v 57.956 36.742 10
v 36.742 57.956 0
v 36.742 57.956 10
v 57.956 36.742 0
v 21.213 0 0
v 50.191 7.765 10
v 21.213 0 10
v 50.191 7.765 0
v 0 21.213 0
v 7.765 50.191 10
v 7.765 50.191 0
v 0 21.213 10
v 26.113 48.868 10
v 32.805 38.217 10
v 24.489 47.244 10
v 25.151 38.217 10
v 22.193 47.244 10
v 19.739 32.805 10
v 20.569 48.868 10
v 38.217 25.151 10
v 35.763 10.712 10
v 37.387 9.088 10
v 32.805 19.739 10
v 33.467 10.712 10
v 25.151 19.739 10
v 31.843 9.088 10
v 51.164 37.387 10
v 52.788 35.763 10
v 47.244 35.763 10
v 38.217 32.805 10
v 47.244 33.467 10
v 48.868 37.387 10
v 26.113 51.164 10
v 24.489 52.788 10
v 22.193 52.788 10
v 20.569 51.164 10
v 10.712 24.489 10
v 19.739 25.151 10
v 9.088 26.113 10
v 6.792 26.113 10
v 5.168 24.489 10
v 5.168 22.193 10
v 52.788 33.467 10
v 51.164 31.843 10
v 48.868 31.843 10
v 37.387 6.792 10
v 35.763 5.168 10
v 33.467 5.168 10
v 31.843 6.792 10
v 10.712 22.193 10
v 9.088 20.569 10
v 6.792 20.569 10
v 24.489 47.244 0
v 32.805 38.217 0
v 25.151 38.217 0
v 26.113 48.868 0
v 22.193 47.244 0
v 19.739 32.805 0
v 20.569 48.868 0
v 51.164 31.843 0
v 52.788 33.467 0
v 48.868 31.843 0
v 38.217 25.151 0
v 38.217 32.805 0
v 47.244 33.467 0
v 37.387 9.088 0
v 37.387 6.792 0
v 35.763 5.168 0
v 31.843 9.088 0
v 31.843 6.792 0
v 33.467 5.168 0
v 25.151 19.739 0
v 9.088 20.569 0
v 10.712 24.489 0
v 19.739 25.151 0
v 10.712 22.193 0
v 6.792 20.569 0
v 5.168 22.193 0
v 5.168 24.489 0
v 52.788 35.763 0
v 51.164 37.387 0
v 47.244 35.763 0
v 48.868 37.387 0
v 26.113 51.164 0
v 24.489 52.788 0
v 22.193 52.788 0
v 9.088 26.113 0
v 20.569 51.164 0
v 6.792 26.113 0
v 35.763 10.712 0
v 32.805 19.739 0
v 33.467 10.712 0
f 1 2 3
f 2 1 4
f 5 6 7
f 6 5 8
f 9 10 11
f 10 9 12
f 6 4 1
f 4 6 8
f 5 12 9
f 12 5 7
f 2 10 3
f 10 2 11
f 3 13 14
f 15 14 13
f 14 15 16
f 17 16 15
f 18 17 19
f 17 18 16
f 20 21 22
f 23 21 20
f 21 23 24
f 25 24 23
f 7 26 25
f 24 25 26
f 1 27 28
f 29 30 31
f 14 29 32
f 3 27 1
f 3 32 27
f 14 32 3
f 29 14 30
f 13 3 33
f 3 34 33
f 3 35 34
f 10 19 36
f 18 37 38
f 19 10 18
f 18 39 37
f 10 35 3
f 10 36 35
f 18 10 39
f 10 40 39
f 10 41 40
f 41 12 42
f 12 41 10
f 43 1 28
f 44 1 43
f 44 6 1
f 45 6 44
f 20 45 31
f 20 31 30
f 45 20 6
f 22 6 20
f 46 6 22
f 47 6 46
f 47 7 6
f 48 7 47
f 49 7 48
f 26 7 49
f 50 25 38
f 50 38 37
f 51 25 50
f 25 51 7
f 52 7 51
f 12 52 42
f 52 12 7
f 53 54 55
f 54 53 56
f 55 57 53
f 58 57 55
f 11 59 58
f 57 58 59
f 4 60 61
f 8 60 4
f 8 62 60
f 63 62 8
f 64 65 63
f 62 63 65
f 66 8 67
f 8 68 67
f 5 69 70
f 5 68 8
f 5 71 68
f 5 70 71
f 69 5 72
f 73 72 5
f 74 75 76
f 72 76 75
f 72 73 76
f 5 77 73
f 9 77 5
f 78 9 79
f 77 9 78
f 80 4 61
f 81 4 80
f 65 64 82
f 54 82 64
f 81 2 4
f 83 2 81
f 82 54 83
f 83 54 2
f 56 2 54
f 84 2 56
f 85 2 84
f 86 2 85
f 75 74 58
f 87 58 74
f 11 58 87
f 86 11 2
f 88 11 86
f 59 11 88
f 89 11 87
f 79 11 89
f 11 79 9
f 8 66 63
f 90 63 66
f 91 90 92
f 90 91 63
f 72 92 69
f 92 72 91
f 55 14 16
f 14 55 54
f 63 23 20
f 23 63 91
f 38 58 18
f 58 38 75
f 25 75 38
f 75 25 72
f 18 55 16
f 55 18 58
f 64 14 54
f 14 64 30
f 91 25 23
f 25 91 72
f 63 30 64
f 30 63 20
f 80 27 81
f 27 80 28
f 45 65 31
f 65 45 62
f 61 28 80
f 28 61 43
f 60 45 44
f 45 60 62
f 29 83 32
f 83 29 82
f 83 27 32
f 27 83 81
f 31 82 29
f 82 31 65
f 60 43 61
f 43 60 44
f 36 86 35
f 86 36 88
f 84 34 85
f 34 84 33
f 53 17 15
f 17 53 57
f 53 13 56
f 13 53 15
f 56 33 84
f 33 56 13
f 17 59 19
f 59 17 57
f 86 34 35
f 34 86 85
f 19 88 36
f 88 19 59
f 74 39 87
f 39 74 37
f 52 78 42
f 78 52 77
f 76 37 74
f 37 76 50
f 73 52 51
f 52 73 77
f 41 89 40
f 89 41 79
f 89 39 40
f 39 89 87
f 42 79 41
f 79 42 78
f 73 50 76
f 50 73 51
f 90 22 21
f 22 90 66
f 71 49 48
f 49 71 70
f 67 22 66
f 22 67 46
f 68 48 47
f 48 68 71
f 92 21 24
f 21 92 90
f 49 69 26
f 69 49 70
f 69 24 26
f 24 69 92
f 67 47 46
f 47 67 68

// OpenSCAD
$fn = 32;

// ----------------------------------------------------------------------
// Polygon plate: 6-gon R30, 4 bolt windows
// ----------------------------------------------------------------------

// --- parameters (mm) ---
sides = 6;                // number of polygon sides
plate_r = 30;             // circumscribed radius of the polygon
bore_r = 10;              // centre bore radius
bolts = 4;                // number of bolt windows
ring_r = 21.78;           // bolt-circle radius
bolt_r = 3;               // bolt window radius
plate_t = 10;             // plate thickness, Z (extrusion height)

plate_d = 2 * plate_r;  // circumscribed diameter
bore_d = 2 * bore_r;  // centre bore diameter
bolt_d = 2 * bolt_r;  // bolt window diameter
ring_d = 2 * ring_r;  // bolt-circle diameter

profile = [[57.956, 36.742], [36.742, 57.956], [7.765, 50.191], [0, 21.213], [21.213, 0], [50.191, 7.765]];  // primary outline, 6 points, counter clockwise
void_1 = [[38.217, 32.805], [32.805, 38.217], [25.151, 38.217], [19.739, 32.805], [19.739, 25.151], [25.151, 19.739], [32.805, 19.739], [38.217, 25.151]];  // centre bore, 8 points
void_2 = [[52.788, 35.763], [51.164, 37.387], [48.868, 37.387], [47.244, 35.763], [47.244, 33.467], [48.868, 31.843], [51.164, 31.843], [52.788, 33.467]];  // bolt window 1, 8 points
void_3 = [[26.113, 51.164], [24.489, 52.788], [22.193, 52.788], [20.569, 51.164], [20.569, 48.868], [22.193, 47.244], [24.489, 47.244], [26.113, 48.868]];  // bolt window 2, 8 points
void_4 = [[10.712, 24.489], [9.088, 26.113], [6.792, 26.113], [5.168, 24.489], [5.168, 22.193], [6.792, 20.569], [9.088, 20.569], [10.712, 22.193]];  // bolt window 3, 8 points
void_5 = [[37.387, 9.088], [35.763, 10.712], [33.467, 10.712], [31.843, 9.088], [31.843, 6.792], [33.467, 5.168], [35.763, 5.168], [37.387, 6.792]];  // bolt window 4, 8 points

// --- the one profile operation ---
difference() {
  linear_extrude(height = plate_t) polygon(points = profile);
  translate([0, 0, -1])
    linear_extrude(height = plate_t + 2) polygon(points = void_1);
  translate([0, 0, -1])
    linear_extrude(height = plate_t + 2) polygon(points = void_2);
  translate([0, 0, -1])
    linear_extrude(height = plate_t + 2) polygon(points = void_3);
  translate([0, 0, -1])
    linear_extrude(height = plate_t + 2) polygon(points = void_4);
  translate([0, 0, -1])
    linear_extrude(height = plate_t + 2) polygon(points = void_5);
}
